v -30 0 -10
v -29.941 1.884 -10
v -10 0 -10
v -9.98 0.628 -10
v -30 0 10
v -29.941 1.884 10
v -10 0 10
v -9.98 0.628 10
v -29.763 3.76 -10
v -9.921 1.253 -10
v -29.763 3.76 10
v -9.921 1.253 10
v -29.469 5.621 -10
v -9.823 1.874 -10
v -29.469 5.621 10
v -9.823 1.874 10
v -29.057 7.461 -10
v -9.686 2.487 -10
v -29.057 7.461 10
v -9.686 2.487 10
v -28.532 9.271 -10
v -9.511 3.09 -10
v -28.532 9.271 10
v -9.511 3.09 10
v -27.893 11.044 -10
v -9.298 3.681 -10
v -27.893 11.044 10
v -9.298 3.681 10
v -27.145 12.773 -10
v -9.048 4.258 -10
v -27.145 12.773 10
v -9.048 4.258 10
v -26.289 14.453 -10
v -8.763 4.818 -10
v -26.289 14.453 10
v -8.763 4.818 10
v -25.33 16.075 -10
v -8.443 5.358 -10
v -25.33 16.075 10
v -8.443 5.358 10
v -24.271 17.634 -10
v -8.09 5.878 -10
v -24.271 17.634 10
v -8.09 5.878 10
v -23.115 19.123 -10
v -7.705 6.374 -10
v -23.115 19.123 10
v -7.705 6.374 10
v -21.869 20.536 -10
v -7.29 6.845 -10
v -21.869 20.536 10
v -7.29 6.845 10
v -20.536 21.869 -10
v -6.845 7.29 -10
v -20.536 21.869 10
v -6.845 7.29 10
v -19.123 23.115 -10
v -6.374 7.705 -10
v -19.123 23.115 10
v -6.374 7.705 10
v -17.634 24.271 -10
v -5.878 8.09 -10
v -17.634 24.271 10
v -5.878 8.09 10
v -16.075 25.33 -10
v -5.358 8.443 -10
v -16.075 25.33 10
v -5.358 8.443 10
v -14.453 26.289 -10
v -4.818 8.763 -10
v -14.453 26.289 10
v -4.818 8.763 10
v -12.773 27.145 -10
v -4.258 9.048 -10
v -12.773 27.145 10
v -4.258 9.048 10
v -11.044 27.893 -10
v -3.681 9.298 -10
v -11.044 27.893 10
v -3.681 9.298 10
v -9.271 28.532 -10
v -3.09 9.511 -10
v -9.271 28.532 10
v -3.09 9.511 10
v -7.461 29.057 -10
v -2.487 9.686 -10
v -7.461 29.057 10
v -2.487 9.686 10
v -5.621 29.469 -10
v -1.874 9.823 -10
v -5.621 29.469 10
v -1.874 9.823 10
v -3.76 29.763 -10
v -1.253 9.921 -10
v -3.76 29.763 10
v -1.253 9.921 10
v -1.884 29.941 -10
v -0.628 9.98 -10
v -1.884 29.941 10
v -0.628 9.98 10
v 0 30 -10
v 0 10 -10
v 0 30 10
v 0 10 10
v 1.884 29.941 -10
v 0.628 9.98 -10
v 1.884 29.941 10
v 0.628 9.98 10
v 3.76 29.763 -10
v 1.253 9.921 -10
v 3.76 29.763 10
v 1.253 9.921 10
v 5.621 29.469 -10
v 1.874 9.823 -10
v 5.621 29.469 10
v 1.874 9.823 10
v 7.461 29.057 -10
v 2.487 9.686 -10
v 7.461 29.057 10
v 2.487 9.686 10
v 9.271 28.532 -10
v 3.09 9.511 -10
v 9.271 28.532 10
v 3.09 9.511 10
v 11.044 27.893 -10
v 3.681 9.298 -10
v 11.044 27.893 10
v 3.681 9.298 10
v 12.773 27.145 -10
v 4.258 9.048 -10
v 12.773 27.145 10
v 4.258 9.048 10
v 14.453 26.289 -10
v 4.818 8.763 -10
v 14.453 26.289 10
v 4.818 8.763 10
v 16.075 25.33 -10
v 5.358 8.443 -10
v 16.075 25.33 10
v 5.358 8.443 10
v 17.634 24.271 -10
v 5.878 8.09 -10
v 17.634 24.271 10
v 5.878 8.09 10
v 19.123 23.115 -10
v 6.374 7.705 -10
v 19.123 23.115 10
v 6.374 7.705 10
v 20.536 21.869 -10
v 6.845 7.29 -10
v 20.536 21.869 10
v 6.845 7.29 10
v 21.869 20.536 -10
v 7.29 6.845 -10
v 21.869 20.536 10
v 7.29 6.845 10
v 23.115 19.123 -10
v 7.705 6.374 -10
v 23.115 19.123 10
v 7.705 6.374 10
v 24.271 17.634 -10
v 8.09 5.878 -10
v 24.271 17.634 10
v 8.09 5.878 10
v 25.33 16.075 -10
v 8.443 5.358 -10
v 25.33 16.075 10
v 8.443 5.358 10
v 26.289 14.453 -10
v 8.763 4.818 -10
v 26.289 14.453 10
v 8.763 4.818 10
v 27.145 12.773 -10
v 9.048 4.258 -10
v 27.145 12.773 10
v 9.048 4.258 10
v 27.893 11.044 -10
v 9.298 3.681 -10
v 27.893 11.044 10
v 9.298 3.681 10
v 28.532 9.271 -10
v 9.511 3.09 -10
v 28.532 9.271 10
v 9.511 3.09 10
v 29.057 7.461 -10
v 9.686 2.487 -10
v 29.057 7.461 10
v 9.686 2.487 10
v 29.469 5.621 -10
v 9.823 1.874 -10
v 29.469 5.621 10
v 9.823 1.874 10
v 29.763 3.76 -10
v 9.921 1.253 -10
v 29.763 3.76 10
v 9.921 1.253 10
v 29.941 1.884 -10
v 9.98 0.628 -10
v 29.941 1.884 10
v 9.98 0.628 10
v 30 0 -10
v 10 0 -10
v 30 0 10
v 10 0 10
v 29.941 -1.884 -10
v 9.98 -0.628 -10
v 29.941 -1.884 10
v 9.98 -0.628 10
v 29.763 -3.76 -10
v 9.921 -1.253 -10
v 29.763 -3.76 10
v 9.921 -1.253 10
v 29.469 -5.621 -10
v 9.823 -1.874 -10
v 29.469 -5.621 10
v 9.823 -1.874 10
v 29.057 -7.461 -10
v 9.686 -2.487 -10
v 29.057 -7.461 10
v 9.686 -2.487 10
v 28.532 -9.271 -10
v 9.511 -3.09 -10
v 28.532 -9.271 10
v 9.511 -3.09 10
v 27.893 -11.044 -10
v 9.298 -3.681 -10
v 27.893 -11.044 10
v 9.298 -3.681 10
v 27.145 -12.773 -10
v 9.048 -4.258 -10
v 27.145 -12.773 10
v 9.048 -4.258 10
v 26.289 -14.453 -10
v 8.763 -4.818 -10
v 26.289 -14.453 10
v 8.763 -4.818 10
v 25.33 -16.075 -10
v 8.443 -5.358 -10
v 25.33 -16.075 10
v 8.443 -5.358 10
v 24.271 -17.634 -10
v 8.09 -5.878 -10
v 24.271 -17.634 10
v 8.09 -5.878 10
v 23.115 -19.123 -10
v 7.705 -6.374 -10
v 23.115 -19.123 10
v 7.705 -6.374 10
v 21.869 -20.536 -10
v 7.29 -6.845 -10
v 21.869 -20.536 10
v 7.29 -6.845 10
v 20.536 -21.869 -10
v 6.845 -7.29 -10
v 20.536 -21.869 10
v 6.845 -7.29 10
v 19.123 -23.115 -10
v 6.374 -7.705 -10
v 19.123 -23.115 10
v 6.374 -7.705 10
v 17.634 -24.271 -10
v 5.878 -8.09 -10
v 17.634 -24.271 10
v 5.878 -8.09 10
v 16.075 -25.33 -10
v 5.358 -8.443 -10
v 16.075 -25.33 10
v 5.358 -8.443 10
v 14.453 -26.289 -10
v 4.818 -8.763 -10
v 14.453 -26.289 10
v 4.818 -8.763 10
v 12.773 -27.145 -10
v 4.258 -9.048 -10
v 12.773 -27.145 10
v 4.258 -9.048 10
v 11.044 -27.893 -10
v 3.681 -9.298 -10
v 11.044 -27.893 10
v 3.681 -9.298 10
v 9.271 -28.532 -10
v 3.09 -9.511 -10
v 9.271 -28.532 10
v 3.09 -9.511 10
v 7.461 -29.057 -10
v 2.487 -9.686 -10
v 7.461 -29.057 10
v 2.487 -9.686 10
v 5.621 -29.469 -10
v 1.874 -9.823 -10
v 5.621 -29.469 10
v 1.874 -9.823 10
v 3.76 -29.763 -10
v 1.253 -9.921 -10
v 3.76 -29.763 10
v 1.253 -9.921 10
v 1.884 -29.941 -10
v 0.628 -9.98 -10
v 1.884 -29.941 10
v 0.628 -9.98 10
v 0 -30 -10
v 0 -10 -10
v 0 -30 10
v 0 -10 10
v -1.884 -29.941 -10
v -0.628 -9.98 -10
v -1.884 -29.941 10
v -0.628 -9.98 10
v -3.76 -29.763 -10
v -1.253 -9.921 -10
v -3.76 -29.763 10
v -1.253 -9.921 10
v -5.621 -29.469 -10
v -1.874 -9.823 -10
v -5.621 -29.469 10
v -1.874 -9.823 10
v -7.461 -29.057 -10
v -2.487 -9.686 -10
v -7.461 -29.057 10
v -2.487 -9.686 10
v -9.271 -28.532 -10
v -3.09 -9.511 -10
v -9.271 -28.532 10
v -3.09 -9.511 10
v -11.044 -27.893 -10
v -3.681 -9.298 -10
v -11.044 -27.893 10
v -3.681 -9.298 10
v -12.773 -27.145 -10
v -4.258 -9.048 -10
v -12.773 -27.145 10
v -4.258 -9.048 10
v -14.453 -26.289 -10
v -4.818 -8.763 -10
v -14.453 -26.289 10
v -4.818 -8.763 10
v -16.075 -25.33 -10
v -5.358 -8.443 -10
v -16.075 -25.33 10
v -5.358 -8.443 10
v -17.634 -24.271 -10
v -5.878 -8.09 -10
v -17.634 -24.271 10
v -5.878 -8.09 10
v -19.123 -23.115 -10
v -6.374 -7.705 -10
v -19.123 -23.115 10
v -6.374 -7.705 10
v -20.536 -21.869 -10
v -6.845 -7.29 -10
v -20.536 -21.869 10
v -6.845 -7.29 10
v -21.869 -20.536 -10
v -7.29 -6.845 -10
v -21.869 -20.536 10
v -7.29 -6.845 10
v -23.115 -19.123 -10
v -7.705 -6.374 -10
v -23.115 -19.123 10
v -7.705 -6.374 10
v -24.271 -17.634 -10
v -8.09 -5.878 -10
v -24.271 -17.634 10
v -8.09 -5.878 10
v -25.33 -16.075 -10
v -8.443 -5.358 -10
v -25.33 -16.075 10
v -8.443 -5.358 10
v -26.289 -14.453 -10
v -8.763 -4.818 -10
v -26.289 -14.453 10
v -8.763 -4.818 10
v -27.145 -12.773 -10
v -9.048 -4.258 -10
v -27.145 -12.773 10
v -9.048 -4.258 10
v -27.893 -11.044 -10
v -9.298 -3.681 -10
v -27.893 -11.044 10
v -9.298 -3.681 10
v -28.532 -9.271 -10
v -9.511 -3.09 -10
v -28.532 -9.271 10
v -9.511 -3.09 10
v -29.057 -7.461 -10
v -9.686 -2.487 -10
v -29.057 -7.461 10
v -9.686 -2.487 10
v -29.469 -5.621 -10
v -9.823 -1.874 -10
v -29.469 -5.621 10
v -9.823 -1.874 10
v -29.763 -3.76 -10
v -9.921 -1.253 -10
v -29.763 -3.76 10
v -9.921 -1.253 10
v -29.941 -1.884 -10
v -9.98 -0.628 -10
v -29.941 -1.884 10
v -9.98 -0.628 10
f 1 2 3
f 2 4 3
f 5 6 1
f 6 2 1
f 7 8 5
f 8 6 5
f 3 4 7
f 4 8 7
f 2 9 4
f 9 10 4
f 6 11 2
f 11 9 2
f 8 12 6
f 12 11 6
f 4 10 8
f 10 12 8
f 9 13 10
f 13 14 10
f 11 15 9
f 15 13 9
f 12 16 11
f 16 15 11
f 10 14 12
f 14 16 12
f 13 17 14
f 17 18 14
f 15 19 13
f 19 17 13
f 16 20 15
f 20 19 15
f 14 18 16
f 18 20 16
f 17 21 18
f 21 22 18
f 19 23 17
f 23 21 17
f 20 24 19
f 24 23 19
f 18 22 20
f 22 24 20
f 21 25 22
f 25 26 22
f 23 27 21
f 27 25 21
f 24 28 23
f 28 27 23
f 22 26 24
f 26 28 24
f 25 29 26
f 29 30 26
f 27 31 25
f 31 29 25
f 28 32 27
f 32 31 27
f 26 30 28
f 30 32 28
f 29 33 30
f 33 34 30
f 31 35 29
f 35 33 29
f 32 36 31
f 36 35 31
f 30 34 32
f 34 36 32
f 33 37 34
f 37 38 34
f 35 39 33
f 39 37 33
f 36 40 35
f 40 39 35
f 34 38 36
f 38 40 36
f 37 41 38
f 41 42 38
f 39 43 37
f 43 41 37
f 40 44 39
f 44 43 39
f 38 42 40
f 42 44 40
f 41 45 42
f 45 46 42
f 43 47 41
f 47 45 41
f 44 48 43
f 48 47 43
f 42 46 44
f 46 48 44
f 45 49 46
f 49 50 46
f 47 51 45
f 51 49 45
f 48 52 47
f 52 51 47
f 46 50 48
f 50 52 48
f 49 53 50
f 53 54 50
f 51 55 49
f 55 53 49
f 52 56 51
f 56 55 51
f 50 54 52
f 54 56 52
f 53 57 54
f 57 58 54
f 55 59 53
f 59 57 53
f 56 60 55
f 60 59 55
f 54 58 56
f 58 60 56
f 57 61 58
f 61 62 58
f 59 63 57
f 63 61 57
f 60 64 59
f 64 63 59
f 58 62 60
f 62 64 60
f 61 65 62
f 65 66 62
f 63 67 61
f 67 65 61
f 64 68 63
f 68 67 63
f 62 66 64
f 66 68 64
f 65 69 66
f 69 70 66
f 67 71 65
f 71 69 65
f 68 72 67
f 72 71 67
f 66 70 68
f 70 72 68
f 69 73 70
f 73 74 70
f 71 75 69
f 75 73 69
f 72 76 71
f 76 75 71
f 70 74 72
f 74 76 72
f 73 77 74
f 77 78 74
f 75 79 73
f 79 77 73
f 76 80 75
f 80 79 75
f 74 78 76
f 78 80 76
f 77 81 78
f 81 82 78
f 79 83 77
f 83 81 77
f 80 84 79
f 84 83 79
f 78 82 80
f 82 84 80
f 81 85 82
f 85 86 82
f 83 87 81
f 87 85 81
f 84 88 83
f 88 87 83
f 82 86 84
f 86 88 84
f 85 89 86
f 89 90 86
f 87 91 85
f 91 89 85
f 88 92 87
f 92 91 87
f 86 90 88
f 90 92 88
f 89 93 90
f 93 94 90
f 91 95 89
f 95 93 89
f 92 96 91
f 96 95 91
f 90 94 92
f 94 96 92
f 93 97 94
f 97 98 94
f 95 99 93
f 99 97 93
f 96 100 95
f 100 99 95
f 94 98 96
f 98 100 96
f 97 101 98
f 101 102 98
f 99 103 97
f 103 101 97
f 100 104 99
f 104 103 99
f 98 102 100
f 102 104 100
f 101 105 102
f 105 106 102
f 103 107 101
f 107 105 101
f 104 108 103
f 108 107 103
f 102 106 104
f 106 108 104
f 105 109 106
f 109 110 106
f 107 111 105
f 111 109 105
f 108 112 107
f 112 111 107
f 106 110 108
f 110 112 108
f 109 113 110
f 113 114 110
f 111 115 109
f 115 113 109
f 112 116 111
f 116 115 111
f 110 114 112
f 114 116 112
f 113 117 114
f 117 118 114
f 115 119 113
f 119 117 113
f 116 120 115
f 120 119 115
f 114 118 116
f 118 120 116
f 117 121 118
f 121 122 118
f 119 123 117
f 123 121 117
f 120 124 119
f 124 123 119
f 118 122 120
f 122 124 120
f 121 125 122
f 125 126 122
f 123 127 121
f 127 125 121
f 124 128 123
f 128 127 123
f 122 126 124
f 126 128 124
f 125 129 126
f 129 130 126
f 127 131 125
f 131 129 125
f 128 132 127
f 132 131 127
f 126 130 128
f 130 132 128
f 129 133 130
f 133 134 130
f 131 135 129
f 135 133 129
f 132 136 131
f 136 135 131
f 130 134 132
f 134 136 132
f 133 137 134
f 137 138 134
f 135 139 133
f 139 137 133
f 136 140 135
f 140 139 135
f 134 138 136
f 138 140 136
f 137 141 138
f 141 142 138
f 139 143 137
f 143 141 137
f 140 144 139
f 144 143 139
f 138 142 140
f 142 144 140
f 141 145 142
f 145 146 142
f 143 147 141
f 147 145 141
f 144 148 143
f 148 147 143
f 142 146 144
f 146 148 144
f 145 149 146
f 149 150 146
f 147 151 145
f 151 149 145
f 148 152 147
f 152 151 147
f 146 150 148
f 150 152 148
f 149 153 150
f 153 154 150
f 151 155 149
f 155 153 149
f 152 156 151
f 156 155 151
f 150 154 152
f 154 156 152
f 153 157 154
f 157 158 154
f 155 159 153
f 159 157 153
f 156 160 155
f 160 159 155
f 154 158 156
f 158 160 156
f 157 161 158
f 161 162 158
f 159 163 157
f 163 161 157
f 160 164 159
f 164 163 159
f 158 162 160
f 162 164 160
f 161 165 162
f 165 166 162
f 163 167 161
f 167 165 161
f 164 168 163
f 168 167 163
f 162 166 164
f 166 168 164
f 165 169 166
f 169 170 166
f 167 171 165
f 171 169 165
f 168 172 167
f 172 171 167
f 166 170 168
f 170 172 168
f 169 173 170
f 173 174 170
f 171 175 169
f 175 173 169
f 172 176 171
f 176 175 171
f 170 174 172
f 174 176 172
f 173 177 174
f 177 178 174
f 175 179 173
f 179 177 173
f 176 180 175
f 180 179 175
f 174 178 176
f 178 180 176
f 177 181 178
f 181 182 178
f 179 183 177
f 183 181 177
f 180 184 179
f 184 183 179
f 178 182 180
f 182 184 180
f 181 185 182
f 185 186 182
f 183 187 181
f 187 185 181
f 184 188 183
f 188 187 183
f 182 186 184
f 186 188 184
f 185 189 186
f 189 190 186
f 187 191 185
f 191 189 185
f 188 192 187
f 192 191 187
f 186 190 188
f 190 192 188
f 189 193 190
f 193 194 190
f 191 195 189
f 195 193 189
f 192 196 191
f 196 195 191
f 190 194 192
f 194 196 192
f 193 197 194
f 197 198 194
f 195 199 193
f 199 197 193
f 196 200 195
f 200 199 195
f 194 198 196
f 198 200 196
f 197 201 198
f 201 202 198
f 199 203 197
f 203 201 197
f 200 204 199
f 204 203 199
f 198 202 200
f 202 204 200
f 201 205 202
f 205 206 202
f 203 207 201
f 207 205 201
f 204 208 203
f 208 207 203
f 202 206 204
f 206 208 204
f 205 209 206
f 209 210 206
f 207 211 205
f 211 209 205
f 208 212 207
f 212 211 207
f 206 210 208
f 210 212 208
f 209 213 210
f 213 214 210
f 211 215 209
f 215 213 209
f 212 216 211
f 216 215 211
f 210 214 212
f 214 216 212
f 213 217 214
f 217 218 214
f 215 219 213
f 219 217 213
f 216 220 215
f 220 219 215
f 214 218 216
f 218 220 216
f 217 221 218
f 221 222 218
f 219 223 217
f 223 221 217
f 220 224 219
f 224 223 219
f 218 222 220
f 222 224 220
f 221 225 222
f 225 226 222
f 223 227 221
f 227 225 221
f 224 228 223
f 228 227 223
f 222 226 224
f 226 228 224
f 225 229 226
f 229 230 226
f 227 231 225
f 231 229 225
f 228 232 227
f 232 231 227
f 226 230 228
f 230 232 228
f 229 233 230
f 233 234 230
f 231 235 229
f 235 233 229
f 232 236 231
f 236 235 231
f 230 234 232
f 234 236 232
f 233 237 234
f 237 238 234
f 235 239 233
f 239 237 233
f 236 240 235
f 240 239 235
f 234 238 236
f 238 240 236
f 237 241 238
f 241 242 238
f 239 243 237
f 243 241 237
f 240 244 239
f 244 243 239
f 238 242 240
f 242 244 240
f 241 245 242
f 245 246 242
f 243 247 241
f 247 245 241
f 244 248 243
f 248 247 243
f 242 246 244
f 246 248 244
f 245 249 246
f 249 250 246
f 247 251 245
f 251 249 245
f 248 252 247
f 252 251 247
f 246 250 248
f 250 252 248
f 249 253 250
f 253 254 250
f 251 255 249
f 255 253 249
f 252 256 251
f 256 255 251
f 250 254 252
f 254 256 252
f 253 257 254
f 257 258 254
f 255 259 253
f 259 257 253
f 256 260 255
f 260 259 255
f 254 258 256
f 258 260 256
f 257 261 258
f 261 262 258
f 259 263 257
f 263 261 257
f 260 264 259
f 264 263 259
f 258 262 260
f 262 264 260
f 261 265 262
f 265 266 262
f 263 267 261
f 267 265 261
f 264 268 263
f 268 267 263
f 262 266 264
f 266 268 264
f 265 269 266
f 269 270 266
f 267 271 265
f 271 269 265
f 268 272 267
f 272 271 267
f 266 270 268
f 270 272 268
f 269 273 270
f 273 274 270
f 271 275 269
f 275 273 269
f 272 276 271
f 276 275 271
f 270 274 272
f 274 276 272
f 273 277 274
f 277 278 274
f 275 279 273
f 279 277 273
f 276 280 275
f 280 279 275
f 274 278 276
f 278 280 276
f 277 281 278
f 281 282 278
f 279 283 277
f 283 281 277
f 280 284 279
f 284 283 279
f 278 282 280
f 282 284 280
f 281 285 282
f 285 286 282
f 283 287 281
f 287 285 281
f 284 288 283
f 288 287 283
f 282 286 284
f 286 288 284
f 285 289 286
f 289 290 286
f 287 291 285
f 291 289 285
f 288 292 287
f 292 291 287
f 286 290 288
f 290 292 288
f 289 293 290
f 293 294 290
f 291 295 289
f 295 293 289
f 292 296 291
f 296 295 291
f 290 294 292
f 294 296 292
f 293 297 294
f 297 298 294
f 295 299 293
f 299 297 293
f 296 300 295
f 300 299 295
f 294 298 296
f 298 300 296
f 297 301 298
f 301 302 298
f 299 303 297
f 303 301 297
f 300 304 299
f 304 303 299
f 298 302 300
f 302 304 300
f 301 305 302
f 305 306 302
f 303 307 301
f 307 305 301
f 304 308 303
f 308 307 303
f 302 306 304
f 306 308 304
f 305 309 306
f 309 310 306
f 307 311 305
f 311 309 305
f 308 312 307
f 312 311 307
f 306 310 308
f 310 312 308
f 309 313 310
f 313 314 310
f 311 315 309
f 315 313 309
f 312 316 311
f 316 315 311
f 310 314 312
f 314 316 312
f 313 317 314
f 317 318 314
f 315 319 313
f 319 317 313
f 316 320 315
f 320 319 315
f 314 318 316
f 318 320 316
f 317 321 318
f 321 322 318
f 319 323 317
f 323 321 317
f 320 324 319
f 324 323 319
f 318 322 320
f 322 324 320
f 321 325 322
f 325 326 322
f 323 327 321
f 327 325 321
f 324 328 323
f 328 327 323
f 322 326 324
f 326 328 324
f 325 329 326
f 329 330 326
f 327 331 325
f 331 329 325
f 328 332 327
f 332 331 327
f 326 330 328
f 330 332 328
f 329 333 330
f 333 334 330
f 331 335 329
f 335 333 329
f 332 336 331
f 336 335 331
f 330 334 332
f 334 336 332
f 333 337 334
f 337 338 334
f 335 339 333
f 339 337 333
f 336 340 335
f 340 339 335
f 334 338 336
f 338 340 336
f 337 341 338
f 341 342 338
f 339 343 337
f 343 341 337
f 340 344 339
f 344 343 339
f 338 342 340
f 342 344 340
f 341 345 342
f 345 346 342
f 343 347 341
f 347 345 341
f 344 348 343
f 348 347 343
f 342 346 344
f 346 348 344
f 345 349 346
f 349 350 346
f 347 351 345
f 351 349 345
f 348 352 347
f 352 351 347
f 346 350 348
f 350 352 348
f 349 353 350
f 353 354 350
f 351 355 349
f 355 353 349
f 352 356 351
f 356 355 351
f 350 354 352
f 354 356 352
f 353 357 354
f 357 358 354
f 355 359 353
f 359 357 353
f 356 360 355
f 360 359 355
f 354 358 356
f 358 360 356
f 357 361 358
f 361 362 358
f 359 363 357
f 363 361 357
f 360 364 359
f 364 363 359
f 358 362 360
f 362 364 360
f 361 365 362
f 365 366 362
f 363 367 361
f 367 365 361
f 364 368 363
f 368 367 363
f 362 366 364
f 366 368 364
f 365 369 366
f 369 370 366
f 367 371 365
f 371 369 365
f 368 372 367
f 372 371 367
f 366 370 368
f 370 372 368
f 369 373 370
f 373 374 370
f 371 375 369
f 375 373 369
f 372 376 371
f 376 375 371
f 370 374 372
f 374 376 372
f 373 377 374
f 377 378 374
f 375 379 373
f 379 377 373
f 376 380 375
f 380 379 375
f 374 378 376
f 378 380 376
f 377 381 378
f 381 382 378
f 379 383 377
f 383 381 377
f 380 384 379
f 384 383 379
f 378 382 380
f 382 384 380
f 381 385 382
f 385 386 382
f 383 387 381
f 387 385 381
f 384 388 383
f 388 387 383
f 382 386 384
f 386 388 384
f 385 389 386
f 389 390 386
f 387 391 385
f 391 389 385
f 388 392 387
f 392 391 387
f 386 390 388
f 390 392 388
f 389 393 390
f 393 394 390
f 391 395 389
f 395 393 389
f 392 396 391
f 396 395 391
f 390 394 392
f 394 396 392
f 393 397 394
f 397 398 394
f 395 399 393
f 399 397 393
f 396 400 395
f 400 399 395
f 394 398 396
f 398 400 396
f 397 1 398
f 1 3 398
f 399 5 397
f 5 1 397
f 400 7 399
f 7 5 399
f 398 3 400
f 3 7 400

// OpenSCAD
//-- Ejemplo 1: Extrusion lineal con giro
*linear_extrude(height = 50, twist = 90, $fn = 100)
  square(size = [10,20],center = true);

//--- Extrusion axial  
//-- Ejemplo 2: Objeto de "revolucion": toro
rotate_extrude($fn = 100)
translate([20, 0, 0])
//circle(d = 20, center = true); 
square([20, 20], center = true);
